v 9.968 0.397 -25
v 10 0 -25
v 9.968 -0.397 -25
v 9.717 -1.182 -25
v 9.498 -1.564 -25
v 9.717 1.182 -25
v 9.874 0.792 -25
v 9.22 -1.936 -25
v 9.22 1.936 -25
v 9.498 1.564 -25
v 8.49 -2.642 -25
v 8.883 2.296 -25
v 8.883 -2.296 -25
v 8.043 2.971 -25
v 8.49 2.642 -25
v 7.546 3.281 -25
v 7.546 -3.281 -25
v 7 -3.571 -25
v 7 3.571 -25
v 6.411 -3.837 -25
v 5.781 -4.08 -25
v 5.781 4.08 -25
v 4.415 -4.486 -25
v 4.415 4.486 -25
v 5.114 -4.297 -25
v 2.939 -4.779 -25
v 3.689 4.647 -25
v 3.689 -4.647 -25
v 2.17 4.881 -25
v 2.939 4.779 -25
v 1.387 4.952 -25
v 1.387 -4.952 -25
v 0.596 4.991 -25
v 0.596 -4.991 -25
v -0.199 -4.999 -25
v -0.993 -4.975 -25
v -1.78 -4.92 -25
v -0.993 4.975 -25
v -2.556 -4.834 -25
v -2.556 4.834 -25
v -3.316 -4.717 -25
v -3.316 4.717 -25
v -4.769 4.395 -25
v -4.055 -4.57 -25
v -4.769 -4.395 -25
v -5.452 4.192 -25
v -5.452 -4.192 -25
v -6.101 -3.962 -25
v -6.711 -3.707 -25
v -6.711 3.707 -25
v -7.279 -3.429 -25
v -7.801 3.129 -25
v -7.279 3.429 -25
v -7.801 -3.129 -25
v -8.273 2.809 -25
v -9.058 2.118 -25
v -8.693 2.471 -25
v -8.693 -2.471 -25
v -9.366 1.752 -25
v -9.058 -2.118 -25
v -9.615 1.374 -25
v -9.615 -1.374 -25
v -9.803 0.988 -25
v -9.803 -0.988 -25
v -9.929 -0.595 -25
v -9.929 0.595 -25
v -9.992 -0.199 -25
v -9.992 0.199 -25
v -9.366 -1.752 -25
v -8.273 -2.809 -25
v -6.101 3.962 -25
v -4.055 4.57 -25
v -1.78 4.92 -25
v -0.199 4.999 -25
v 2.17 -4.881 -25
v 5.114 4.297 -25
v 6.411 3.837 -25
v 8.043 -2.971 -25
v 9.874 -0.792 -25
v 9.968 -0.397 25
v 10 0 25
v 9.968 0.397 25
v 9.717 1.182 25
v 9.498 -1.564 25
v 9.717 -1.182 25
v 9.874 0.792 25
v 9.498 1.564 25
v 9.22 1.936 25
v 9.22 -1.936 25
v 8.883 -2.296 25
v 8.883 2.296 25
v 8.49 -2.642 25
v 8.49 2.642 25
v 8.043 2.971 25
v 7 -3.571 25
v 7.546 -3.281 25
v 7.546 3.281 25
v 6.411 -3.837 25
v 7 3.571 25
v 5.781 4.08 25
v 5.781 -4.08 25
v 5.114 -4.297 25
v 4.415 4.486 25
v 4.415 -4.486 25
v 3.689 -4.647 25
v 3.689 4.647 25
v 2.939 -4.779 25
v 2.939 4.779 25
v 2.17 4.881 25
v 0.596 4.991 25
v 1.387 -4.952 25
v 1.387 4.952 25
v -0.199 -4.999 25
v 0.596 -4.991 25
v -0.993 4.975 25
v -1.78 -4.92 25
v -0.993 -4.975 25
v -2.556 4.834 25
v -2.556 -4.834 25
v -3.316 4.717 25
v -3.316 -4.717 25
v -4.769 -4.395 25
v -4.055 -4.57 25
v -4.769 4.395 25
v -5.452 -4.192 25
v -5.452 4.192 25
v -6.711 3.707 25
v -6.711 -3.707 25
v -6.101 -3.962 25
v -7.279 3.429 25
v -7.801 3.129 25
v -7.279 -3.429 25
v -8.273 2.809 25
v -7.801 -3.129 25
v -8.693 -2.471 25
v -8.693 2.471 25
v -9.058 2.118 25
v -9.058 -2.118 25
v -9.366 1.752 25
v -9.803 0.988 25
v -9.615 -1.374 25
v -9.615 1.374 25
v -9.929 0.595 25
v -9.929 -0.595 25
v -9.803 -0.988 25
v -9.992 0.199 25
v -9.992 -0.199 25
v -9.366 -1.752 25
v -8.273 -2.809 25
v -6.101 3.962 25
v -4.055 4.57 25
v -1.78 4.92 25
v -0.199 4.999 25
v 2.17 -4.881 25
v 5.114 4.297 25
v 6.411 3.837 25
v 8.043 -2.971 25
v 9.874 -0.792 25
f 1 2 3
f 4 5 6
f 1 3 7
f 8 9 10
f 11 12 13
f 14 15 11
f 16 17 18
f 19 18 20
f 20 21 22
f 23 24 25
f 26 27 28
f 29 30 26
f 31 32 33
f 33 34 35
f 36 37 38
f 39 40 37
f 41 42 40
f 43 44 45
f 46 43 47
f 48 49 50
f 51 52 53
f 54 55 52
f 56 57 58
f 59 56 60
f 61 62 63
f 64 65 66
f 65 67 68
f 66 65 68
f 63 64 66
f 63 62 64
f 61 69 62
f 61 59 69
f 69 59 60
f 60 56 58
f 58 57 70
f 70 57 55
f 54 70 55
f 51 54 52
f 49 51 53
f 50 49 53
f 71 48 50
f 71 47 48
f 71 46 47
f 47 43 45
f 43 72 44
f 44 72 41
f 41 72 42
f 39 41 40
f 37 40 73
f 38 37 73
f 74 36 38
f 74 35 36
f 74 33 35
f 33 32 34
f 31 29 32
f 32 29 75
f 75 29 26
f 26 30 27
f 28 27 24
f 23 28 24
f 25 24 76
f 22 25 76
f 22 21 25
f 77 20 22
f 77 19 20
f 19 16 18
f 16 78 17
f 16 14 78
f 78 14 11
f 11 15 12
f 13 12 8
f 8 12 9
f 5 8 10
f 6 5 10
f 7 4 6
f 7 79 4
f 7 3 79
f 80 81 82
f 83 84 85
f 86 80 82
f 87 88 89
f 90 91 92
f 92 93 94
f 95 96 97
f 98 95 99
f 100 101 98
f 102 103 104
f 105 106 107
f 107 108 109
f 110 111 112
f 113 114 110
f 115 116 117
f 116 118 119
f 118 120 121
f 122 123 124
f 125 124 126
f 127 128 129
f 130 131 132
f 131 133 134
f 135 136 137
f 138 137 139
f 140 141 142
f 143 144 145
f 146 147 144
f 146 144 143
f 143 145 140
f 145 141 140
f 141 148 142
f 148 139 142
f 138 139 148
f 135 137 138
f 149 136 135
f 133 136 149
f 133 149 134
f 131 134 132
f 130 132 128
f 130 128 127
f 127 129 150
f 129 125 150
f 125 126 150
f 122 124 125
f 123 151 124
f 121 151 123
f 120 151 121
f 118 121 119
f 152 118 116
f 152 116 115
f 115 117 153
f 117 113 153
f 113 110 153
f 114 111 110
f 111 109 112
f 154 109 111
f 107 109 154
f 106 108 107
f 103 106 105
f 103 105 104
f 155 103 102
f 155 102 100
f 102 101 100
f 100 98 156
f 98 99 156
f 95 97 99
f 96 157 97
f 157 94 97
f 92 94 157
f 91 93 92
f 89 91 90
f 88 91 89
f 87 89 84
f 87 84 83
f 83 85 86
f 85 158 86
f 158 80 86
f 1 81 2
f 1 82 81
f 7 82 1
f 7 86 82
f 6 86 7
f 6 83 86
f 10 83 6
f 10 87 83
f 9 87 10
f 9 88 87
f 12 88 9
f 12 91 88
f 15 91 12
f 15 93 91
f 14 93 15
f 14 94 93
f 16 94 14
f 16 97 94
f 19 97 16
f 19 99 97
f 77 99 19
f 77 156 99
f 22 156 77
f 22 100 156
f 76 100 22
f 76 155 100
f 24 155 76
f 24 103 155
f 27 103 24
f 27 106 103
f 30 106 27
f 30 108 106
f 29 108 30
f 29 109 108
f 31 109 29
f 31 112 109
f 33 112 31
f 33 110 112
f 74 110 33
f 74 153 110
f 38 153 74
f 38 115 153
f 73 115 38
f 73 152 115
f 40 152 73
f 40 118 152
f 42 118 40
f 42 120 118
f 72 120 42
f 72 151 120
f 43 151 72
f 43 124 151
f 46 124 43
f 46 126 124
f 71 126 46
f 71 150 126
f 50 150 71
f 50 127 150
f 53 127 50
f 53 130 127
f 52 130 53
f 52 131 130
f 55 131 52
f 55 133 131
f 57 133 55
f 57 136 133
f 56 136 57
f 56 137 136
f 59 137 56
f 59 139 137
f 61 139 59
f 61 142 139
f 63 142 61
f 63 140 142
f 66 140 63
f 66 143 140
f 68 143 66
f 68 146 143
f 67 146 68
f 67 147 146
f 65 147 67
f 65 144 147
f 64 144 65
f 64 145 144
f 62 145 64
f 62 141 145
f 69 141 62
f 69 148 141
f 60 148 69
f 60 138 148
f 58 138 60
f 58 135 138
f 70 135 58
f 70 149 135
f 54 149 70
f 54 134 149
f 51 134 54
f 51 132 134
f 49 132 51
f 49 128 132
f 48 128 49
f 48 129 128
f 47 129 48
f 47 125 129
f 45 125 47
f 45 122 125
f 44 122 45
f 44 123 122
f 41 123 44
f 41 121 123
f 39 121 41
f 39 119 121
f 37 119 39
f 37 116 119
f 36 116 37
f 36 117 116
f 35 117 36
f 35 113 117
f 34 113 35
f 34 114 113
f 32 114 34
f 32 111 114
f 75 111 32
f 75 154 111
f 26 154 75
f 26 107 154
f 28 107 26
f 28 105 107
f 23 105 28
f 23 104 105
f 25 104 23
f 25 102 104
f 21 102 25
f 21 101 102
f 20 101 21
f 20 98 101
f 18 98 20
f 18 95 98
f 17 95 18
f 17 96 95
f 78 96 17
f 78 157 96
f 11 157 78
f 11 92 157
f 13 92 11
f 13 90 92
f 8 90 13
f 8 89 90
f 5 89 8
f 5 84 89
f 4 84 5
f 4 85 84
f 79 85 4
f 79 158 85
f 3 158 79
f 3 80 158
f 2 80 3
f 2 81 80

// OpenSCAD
$fa = 1;
$fs = 0.4;
linear_extrude(height=50,center=true)
    scale([2,1,1])
    circle(d=10);
